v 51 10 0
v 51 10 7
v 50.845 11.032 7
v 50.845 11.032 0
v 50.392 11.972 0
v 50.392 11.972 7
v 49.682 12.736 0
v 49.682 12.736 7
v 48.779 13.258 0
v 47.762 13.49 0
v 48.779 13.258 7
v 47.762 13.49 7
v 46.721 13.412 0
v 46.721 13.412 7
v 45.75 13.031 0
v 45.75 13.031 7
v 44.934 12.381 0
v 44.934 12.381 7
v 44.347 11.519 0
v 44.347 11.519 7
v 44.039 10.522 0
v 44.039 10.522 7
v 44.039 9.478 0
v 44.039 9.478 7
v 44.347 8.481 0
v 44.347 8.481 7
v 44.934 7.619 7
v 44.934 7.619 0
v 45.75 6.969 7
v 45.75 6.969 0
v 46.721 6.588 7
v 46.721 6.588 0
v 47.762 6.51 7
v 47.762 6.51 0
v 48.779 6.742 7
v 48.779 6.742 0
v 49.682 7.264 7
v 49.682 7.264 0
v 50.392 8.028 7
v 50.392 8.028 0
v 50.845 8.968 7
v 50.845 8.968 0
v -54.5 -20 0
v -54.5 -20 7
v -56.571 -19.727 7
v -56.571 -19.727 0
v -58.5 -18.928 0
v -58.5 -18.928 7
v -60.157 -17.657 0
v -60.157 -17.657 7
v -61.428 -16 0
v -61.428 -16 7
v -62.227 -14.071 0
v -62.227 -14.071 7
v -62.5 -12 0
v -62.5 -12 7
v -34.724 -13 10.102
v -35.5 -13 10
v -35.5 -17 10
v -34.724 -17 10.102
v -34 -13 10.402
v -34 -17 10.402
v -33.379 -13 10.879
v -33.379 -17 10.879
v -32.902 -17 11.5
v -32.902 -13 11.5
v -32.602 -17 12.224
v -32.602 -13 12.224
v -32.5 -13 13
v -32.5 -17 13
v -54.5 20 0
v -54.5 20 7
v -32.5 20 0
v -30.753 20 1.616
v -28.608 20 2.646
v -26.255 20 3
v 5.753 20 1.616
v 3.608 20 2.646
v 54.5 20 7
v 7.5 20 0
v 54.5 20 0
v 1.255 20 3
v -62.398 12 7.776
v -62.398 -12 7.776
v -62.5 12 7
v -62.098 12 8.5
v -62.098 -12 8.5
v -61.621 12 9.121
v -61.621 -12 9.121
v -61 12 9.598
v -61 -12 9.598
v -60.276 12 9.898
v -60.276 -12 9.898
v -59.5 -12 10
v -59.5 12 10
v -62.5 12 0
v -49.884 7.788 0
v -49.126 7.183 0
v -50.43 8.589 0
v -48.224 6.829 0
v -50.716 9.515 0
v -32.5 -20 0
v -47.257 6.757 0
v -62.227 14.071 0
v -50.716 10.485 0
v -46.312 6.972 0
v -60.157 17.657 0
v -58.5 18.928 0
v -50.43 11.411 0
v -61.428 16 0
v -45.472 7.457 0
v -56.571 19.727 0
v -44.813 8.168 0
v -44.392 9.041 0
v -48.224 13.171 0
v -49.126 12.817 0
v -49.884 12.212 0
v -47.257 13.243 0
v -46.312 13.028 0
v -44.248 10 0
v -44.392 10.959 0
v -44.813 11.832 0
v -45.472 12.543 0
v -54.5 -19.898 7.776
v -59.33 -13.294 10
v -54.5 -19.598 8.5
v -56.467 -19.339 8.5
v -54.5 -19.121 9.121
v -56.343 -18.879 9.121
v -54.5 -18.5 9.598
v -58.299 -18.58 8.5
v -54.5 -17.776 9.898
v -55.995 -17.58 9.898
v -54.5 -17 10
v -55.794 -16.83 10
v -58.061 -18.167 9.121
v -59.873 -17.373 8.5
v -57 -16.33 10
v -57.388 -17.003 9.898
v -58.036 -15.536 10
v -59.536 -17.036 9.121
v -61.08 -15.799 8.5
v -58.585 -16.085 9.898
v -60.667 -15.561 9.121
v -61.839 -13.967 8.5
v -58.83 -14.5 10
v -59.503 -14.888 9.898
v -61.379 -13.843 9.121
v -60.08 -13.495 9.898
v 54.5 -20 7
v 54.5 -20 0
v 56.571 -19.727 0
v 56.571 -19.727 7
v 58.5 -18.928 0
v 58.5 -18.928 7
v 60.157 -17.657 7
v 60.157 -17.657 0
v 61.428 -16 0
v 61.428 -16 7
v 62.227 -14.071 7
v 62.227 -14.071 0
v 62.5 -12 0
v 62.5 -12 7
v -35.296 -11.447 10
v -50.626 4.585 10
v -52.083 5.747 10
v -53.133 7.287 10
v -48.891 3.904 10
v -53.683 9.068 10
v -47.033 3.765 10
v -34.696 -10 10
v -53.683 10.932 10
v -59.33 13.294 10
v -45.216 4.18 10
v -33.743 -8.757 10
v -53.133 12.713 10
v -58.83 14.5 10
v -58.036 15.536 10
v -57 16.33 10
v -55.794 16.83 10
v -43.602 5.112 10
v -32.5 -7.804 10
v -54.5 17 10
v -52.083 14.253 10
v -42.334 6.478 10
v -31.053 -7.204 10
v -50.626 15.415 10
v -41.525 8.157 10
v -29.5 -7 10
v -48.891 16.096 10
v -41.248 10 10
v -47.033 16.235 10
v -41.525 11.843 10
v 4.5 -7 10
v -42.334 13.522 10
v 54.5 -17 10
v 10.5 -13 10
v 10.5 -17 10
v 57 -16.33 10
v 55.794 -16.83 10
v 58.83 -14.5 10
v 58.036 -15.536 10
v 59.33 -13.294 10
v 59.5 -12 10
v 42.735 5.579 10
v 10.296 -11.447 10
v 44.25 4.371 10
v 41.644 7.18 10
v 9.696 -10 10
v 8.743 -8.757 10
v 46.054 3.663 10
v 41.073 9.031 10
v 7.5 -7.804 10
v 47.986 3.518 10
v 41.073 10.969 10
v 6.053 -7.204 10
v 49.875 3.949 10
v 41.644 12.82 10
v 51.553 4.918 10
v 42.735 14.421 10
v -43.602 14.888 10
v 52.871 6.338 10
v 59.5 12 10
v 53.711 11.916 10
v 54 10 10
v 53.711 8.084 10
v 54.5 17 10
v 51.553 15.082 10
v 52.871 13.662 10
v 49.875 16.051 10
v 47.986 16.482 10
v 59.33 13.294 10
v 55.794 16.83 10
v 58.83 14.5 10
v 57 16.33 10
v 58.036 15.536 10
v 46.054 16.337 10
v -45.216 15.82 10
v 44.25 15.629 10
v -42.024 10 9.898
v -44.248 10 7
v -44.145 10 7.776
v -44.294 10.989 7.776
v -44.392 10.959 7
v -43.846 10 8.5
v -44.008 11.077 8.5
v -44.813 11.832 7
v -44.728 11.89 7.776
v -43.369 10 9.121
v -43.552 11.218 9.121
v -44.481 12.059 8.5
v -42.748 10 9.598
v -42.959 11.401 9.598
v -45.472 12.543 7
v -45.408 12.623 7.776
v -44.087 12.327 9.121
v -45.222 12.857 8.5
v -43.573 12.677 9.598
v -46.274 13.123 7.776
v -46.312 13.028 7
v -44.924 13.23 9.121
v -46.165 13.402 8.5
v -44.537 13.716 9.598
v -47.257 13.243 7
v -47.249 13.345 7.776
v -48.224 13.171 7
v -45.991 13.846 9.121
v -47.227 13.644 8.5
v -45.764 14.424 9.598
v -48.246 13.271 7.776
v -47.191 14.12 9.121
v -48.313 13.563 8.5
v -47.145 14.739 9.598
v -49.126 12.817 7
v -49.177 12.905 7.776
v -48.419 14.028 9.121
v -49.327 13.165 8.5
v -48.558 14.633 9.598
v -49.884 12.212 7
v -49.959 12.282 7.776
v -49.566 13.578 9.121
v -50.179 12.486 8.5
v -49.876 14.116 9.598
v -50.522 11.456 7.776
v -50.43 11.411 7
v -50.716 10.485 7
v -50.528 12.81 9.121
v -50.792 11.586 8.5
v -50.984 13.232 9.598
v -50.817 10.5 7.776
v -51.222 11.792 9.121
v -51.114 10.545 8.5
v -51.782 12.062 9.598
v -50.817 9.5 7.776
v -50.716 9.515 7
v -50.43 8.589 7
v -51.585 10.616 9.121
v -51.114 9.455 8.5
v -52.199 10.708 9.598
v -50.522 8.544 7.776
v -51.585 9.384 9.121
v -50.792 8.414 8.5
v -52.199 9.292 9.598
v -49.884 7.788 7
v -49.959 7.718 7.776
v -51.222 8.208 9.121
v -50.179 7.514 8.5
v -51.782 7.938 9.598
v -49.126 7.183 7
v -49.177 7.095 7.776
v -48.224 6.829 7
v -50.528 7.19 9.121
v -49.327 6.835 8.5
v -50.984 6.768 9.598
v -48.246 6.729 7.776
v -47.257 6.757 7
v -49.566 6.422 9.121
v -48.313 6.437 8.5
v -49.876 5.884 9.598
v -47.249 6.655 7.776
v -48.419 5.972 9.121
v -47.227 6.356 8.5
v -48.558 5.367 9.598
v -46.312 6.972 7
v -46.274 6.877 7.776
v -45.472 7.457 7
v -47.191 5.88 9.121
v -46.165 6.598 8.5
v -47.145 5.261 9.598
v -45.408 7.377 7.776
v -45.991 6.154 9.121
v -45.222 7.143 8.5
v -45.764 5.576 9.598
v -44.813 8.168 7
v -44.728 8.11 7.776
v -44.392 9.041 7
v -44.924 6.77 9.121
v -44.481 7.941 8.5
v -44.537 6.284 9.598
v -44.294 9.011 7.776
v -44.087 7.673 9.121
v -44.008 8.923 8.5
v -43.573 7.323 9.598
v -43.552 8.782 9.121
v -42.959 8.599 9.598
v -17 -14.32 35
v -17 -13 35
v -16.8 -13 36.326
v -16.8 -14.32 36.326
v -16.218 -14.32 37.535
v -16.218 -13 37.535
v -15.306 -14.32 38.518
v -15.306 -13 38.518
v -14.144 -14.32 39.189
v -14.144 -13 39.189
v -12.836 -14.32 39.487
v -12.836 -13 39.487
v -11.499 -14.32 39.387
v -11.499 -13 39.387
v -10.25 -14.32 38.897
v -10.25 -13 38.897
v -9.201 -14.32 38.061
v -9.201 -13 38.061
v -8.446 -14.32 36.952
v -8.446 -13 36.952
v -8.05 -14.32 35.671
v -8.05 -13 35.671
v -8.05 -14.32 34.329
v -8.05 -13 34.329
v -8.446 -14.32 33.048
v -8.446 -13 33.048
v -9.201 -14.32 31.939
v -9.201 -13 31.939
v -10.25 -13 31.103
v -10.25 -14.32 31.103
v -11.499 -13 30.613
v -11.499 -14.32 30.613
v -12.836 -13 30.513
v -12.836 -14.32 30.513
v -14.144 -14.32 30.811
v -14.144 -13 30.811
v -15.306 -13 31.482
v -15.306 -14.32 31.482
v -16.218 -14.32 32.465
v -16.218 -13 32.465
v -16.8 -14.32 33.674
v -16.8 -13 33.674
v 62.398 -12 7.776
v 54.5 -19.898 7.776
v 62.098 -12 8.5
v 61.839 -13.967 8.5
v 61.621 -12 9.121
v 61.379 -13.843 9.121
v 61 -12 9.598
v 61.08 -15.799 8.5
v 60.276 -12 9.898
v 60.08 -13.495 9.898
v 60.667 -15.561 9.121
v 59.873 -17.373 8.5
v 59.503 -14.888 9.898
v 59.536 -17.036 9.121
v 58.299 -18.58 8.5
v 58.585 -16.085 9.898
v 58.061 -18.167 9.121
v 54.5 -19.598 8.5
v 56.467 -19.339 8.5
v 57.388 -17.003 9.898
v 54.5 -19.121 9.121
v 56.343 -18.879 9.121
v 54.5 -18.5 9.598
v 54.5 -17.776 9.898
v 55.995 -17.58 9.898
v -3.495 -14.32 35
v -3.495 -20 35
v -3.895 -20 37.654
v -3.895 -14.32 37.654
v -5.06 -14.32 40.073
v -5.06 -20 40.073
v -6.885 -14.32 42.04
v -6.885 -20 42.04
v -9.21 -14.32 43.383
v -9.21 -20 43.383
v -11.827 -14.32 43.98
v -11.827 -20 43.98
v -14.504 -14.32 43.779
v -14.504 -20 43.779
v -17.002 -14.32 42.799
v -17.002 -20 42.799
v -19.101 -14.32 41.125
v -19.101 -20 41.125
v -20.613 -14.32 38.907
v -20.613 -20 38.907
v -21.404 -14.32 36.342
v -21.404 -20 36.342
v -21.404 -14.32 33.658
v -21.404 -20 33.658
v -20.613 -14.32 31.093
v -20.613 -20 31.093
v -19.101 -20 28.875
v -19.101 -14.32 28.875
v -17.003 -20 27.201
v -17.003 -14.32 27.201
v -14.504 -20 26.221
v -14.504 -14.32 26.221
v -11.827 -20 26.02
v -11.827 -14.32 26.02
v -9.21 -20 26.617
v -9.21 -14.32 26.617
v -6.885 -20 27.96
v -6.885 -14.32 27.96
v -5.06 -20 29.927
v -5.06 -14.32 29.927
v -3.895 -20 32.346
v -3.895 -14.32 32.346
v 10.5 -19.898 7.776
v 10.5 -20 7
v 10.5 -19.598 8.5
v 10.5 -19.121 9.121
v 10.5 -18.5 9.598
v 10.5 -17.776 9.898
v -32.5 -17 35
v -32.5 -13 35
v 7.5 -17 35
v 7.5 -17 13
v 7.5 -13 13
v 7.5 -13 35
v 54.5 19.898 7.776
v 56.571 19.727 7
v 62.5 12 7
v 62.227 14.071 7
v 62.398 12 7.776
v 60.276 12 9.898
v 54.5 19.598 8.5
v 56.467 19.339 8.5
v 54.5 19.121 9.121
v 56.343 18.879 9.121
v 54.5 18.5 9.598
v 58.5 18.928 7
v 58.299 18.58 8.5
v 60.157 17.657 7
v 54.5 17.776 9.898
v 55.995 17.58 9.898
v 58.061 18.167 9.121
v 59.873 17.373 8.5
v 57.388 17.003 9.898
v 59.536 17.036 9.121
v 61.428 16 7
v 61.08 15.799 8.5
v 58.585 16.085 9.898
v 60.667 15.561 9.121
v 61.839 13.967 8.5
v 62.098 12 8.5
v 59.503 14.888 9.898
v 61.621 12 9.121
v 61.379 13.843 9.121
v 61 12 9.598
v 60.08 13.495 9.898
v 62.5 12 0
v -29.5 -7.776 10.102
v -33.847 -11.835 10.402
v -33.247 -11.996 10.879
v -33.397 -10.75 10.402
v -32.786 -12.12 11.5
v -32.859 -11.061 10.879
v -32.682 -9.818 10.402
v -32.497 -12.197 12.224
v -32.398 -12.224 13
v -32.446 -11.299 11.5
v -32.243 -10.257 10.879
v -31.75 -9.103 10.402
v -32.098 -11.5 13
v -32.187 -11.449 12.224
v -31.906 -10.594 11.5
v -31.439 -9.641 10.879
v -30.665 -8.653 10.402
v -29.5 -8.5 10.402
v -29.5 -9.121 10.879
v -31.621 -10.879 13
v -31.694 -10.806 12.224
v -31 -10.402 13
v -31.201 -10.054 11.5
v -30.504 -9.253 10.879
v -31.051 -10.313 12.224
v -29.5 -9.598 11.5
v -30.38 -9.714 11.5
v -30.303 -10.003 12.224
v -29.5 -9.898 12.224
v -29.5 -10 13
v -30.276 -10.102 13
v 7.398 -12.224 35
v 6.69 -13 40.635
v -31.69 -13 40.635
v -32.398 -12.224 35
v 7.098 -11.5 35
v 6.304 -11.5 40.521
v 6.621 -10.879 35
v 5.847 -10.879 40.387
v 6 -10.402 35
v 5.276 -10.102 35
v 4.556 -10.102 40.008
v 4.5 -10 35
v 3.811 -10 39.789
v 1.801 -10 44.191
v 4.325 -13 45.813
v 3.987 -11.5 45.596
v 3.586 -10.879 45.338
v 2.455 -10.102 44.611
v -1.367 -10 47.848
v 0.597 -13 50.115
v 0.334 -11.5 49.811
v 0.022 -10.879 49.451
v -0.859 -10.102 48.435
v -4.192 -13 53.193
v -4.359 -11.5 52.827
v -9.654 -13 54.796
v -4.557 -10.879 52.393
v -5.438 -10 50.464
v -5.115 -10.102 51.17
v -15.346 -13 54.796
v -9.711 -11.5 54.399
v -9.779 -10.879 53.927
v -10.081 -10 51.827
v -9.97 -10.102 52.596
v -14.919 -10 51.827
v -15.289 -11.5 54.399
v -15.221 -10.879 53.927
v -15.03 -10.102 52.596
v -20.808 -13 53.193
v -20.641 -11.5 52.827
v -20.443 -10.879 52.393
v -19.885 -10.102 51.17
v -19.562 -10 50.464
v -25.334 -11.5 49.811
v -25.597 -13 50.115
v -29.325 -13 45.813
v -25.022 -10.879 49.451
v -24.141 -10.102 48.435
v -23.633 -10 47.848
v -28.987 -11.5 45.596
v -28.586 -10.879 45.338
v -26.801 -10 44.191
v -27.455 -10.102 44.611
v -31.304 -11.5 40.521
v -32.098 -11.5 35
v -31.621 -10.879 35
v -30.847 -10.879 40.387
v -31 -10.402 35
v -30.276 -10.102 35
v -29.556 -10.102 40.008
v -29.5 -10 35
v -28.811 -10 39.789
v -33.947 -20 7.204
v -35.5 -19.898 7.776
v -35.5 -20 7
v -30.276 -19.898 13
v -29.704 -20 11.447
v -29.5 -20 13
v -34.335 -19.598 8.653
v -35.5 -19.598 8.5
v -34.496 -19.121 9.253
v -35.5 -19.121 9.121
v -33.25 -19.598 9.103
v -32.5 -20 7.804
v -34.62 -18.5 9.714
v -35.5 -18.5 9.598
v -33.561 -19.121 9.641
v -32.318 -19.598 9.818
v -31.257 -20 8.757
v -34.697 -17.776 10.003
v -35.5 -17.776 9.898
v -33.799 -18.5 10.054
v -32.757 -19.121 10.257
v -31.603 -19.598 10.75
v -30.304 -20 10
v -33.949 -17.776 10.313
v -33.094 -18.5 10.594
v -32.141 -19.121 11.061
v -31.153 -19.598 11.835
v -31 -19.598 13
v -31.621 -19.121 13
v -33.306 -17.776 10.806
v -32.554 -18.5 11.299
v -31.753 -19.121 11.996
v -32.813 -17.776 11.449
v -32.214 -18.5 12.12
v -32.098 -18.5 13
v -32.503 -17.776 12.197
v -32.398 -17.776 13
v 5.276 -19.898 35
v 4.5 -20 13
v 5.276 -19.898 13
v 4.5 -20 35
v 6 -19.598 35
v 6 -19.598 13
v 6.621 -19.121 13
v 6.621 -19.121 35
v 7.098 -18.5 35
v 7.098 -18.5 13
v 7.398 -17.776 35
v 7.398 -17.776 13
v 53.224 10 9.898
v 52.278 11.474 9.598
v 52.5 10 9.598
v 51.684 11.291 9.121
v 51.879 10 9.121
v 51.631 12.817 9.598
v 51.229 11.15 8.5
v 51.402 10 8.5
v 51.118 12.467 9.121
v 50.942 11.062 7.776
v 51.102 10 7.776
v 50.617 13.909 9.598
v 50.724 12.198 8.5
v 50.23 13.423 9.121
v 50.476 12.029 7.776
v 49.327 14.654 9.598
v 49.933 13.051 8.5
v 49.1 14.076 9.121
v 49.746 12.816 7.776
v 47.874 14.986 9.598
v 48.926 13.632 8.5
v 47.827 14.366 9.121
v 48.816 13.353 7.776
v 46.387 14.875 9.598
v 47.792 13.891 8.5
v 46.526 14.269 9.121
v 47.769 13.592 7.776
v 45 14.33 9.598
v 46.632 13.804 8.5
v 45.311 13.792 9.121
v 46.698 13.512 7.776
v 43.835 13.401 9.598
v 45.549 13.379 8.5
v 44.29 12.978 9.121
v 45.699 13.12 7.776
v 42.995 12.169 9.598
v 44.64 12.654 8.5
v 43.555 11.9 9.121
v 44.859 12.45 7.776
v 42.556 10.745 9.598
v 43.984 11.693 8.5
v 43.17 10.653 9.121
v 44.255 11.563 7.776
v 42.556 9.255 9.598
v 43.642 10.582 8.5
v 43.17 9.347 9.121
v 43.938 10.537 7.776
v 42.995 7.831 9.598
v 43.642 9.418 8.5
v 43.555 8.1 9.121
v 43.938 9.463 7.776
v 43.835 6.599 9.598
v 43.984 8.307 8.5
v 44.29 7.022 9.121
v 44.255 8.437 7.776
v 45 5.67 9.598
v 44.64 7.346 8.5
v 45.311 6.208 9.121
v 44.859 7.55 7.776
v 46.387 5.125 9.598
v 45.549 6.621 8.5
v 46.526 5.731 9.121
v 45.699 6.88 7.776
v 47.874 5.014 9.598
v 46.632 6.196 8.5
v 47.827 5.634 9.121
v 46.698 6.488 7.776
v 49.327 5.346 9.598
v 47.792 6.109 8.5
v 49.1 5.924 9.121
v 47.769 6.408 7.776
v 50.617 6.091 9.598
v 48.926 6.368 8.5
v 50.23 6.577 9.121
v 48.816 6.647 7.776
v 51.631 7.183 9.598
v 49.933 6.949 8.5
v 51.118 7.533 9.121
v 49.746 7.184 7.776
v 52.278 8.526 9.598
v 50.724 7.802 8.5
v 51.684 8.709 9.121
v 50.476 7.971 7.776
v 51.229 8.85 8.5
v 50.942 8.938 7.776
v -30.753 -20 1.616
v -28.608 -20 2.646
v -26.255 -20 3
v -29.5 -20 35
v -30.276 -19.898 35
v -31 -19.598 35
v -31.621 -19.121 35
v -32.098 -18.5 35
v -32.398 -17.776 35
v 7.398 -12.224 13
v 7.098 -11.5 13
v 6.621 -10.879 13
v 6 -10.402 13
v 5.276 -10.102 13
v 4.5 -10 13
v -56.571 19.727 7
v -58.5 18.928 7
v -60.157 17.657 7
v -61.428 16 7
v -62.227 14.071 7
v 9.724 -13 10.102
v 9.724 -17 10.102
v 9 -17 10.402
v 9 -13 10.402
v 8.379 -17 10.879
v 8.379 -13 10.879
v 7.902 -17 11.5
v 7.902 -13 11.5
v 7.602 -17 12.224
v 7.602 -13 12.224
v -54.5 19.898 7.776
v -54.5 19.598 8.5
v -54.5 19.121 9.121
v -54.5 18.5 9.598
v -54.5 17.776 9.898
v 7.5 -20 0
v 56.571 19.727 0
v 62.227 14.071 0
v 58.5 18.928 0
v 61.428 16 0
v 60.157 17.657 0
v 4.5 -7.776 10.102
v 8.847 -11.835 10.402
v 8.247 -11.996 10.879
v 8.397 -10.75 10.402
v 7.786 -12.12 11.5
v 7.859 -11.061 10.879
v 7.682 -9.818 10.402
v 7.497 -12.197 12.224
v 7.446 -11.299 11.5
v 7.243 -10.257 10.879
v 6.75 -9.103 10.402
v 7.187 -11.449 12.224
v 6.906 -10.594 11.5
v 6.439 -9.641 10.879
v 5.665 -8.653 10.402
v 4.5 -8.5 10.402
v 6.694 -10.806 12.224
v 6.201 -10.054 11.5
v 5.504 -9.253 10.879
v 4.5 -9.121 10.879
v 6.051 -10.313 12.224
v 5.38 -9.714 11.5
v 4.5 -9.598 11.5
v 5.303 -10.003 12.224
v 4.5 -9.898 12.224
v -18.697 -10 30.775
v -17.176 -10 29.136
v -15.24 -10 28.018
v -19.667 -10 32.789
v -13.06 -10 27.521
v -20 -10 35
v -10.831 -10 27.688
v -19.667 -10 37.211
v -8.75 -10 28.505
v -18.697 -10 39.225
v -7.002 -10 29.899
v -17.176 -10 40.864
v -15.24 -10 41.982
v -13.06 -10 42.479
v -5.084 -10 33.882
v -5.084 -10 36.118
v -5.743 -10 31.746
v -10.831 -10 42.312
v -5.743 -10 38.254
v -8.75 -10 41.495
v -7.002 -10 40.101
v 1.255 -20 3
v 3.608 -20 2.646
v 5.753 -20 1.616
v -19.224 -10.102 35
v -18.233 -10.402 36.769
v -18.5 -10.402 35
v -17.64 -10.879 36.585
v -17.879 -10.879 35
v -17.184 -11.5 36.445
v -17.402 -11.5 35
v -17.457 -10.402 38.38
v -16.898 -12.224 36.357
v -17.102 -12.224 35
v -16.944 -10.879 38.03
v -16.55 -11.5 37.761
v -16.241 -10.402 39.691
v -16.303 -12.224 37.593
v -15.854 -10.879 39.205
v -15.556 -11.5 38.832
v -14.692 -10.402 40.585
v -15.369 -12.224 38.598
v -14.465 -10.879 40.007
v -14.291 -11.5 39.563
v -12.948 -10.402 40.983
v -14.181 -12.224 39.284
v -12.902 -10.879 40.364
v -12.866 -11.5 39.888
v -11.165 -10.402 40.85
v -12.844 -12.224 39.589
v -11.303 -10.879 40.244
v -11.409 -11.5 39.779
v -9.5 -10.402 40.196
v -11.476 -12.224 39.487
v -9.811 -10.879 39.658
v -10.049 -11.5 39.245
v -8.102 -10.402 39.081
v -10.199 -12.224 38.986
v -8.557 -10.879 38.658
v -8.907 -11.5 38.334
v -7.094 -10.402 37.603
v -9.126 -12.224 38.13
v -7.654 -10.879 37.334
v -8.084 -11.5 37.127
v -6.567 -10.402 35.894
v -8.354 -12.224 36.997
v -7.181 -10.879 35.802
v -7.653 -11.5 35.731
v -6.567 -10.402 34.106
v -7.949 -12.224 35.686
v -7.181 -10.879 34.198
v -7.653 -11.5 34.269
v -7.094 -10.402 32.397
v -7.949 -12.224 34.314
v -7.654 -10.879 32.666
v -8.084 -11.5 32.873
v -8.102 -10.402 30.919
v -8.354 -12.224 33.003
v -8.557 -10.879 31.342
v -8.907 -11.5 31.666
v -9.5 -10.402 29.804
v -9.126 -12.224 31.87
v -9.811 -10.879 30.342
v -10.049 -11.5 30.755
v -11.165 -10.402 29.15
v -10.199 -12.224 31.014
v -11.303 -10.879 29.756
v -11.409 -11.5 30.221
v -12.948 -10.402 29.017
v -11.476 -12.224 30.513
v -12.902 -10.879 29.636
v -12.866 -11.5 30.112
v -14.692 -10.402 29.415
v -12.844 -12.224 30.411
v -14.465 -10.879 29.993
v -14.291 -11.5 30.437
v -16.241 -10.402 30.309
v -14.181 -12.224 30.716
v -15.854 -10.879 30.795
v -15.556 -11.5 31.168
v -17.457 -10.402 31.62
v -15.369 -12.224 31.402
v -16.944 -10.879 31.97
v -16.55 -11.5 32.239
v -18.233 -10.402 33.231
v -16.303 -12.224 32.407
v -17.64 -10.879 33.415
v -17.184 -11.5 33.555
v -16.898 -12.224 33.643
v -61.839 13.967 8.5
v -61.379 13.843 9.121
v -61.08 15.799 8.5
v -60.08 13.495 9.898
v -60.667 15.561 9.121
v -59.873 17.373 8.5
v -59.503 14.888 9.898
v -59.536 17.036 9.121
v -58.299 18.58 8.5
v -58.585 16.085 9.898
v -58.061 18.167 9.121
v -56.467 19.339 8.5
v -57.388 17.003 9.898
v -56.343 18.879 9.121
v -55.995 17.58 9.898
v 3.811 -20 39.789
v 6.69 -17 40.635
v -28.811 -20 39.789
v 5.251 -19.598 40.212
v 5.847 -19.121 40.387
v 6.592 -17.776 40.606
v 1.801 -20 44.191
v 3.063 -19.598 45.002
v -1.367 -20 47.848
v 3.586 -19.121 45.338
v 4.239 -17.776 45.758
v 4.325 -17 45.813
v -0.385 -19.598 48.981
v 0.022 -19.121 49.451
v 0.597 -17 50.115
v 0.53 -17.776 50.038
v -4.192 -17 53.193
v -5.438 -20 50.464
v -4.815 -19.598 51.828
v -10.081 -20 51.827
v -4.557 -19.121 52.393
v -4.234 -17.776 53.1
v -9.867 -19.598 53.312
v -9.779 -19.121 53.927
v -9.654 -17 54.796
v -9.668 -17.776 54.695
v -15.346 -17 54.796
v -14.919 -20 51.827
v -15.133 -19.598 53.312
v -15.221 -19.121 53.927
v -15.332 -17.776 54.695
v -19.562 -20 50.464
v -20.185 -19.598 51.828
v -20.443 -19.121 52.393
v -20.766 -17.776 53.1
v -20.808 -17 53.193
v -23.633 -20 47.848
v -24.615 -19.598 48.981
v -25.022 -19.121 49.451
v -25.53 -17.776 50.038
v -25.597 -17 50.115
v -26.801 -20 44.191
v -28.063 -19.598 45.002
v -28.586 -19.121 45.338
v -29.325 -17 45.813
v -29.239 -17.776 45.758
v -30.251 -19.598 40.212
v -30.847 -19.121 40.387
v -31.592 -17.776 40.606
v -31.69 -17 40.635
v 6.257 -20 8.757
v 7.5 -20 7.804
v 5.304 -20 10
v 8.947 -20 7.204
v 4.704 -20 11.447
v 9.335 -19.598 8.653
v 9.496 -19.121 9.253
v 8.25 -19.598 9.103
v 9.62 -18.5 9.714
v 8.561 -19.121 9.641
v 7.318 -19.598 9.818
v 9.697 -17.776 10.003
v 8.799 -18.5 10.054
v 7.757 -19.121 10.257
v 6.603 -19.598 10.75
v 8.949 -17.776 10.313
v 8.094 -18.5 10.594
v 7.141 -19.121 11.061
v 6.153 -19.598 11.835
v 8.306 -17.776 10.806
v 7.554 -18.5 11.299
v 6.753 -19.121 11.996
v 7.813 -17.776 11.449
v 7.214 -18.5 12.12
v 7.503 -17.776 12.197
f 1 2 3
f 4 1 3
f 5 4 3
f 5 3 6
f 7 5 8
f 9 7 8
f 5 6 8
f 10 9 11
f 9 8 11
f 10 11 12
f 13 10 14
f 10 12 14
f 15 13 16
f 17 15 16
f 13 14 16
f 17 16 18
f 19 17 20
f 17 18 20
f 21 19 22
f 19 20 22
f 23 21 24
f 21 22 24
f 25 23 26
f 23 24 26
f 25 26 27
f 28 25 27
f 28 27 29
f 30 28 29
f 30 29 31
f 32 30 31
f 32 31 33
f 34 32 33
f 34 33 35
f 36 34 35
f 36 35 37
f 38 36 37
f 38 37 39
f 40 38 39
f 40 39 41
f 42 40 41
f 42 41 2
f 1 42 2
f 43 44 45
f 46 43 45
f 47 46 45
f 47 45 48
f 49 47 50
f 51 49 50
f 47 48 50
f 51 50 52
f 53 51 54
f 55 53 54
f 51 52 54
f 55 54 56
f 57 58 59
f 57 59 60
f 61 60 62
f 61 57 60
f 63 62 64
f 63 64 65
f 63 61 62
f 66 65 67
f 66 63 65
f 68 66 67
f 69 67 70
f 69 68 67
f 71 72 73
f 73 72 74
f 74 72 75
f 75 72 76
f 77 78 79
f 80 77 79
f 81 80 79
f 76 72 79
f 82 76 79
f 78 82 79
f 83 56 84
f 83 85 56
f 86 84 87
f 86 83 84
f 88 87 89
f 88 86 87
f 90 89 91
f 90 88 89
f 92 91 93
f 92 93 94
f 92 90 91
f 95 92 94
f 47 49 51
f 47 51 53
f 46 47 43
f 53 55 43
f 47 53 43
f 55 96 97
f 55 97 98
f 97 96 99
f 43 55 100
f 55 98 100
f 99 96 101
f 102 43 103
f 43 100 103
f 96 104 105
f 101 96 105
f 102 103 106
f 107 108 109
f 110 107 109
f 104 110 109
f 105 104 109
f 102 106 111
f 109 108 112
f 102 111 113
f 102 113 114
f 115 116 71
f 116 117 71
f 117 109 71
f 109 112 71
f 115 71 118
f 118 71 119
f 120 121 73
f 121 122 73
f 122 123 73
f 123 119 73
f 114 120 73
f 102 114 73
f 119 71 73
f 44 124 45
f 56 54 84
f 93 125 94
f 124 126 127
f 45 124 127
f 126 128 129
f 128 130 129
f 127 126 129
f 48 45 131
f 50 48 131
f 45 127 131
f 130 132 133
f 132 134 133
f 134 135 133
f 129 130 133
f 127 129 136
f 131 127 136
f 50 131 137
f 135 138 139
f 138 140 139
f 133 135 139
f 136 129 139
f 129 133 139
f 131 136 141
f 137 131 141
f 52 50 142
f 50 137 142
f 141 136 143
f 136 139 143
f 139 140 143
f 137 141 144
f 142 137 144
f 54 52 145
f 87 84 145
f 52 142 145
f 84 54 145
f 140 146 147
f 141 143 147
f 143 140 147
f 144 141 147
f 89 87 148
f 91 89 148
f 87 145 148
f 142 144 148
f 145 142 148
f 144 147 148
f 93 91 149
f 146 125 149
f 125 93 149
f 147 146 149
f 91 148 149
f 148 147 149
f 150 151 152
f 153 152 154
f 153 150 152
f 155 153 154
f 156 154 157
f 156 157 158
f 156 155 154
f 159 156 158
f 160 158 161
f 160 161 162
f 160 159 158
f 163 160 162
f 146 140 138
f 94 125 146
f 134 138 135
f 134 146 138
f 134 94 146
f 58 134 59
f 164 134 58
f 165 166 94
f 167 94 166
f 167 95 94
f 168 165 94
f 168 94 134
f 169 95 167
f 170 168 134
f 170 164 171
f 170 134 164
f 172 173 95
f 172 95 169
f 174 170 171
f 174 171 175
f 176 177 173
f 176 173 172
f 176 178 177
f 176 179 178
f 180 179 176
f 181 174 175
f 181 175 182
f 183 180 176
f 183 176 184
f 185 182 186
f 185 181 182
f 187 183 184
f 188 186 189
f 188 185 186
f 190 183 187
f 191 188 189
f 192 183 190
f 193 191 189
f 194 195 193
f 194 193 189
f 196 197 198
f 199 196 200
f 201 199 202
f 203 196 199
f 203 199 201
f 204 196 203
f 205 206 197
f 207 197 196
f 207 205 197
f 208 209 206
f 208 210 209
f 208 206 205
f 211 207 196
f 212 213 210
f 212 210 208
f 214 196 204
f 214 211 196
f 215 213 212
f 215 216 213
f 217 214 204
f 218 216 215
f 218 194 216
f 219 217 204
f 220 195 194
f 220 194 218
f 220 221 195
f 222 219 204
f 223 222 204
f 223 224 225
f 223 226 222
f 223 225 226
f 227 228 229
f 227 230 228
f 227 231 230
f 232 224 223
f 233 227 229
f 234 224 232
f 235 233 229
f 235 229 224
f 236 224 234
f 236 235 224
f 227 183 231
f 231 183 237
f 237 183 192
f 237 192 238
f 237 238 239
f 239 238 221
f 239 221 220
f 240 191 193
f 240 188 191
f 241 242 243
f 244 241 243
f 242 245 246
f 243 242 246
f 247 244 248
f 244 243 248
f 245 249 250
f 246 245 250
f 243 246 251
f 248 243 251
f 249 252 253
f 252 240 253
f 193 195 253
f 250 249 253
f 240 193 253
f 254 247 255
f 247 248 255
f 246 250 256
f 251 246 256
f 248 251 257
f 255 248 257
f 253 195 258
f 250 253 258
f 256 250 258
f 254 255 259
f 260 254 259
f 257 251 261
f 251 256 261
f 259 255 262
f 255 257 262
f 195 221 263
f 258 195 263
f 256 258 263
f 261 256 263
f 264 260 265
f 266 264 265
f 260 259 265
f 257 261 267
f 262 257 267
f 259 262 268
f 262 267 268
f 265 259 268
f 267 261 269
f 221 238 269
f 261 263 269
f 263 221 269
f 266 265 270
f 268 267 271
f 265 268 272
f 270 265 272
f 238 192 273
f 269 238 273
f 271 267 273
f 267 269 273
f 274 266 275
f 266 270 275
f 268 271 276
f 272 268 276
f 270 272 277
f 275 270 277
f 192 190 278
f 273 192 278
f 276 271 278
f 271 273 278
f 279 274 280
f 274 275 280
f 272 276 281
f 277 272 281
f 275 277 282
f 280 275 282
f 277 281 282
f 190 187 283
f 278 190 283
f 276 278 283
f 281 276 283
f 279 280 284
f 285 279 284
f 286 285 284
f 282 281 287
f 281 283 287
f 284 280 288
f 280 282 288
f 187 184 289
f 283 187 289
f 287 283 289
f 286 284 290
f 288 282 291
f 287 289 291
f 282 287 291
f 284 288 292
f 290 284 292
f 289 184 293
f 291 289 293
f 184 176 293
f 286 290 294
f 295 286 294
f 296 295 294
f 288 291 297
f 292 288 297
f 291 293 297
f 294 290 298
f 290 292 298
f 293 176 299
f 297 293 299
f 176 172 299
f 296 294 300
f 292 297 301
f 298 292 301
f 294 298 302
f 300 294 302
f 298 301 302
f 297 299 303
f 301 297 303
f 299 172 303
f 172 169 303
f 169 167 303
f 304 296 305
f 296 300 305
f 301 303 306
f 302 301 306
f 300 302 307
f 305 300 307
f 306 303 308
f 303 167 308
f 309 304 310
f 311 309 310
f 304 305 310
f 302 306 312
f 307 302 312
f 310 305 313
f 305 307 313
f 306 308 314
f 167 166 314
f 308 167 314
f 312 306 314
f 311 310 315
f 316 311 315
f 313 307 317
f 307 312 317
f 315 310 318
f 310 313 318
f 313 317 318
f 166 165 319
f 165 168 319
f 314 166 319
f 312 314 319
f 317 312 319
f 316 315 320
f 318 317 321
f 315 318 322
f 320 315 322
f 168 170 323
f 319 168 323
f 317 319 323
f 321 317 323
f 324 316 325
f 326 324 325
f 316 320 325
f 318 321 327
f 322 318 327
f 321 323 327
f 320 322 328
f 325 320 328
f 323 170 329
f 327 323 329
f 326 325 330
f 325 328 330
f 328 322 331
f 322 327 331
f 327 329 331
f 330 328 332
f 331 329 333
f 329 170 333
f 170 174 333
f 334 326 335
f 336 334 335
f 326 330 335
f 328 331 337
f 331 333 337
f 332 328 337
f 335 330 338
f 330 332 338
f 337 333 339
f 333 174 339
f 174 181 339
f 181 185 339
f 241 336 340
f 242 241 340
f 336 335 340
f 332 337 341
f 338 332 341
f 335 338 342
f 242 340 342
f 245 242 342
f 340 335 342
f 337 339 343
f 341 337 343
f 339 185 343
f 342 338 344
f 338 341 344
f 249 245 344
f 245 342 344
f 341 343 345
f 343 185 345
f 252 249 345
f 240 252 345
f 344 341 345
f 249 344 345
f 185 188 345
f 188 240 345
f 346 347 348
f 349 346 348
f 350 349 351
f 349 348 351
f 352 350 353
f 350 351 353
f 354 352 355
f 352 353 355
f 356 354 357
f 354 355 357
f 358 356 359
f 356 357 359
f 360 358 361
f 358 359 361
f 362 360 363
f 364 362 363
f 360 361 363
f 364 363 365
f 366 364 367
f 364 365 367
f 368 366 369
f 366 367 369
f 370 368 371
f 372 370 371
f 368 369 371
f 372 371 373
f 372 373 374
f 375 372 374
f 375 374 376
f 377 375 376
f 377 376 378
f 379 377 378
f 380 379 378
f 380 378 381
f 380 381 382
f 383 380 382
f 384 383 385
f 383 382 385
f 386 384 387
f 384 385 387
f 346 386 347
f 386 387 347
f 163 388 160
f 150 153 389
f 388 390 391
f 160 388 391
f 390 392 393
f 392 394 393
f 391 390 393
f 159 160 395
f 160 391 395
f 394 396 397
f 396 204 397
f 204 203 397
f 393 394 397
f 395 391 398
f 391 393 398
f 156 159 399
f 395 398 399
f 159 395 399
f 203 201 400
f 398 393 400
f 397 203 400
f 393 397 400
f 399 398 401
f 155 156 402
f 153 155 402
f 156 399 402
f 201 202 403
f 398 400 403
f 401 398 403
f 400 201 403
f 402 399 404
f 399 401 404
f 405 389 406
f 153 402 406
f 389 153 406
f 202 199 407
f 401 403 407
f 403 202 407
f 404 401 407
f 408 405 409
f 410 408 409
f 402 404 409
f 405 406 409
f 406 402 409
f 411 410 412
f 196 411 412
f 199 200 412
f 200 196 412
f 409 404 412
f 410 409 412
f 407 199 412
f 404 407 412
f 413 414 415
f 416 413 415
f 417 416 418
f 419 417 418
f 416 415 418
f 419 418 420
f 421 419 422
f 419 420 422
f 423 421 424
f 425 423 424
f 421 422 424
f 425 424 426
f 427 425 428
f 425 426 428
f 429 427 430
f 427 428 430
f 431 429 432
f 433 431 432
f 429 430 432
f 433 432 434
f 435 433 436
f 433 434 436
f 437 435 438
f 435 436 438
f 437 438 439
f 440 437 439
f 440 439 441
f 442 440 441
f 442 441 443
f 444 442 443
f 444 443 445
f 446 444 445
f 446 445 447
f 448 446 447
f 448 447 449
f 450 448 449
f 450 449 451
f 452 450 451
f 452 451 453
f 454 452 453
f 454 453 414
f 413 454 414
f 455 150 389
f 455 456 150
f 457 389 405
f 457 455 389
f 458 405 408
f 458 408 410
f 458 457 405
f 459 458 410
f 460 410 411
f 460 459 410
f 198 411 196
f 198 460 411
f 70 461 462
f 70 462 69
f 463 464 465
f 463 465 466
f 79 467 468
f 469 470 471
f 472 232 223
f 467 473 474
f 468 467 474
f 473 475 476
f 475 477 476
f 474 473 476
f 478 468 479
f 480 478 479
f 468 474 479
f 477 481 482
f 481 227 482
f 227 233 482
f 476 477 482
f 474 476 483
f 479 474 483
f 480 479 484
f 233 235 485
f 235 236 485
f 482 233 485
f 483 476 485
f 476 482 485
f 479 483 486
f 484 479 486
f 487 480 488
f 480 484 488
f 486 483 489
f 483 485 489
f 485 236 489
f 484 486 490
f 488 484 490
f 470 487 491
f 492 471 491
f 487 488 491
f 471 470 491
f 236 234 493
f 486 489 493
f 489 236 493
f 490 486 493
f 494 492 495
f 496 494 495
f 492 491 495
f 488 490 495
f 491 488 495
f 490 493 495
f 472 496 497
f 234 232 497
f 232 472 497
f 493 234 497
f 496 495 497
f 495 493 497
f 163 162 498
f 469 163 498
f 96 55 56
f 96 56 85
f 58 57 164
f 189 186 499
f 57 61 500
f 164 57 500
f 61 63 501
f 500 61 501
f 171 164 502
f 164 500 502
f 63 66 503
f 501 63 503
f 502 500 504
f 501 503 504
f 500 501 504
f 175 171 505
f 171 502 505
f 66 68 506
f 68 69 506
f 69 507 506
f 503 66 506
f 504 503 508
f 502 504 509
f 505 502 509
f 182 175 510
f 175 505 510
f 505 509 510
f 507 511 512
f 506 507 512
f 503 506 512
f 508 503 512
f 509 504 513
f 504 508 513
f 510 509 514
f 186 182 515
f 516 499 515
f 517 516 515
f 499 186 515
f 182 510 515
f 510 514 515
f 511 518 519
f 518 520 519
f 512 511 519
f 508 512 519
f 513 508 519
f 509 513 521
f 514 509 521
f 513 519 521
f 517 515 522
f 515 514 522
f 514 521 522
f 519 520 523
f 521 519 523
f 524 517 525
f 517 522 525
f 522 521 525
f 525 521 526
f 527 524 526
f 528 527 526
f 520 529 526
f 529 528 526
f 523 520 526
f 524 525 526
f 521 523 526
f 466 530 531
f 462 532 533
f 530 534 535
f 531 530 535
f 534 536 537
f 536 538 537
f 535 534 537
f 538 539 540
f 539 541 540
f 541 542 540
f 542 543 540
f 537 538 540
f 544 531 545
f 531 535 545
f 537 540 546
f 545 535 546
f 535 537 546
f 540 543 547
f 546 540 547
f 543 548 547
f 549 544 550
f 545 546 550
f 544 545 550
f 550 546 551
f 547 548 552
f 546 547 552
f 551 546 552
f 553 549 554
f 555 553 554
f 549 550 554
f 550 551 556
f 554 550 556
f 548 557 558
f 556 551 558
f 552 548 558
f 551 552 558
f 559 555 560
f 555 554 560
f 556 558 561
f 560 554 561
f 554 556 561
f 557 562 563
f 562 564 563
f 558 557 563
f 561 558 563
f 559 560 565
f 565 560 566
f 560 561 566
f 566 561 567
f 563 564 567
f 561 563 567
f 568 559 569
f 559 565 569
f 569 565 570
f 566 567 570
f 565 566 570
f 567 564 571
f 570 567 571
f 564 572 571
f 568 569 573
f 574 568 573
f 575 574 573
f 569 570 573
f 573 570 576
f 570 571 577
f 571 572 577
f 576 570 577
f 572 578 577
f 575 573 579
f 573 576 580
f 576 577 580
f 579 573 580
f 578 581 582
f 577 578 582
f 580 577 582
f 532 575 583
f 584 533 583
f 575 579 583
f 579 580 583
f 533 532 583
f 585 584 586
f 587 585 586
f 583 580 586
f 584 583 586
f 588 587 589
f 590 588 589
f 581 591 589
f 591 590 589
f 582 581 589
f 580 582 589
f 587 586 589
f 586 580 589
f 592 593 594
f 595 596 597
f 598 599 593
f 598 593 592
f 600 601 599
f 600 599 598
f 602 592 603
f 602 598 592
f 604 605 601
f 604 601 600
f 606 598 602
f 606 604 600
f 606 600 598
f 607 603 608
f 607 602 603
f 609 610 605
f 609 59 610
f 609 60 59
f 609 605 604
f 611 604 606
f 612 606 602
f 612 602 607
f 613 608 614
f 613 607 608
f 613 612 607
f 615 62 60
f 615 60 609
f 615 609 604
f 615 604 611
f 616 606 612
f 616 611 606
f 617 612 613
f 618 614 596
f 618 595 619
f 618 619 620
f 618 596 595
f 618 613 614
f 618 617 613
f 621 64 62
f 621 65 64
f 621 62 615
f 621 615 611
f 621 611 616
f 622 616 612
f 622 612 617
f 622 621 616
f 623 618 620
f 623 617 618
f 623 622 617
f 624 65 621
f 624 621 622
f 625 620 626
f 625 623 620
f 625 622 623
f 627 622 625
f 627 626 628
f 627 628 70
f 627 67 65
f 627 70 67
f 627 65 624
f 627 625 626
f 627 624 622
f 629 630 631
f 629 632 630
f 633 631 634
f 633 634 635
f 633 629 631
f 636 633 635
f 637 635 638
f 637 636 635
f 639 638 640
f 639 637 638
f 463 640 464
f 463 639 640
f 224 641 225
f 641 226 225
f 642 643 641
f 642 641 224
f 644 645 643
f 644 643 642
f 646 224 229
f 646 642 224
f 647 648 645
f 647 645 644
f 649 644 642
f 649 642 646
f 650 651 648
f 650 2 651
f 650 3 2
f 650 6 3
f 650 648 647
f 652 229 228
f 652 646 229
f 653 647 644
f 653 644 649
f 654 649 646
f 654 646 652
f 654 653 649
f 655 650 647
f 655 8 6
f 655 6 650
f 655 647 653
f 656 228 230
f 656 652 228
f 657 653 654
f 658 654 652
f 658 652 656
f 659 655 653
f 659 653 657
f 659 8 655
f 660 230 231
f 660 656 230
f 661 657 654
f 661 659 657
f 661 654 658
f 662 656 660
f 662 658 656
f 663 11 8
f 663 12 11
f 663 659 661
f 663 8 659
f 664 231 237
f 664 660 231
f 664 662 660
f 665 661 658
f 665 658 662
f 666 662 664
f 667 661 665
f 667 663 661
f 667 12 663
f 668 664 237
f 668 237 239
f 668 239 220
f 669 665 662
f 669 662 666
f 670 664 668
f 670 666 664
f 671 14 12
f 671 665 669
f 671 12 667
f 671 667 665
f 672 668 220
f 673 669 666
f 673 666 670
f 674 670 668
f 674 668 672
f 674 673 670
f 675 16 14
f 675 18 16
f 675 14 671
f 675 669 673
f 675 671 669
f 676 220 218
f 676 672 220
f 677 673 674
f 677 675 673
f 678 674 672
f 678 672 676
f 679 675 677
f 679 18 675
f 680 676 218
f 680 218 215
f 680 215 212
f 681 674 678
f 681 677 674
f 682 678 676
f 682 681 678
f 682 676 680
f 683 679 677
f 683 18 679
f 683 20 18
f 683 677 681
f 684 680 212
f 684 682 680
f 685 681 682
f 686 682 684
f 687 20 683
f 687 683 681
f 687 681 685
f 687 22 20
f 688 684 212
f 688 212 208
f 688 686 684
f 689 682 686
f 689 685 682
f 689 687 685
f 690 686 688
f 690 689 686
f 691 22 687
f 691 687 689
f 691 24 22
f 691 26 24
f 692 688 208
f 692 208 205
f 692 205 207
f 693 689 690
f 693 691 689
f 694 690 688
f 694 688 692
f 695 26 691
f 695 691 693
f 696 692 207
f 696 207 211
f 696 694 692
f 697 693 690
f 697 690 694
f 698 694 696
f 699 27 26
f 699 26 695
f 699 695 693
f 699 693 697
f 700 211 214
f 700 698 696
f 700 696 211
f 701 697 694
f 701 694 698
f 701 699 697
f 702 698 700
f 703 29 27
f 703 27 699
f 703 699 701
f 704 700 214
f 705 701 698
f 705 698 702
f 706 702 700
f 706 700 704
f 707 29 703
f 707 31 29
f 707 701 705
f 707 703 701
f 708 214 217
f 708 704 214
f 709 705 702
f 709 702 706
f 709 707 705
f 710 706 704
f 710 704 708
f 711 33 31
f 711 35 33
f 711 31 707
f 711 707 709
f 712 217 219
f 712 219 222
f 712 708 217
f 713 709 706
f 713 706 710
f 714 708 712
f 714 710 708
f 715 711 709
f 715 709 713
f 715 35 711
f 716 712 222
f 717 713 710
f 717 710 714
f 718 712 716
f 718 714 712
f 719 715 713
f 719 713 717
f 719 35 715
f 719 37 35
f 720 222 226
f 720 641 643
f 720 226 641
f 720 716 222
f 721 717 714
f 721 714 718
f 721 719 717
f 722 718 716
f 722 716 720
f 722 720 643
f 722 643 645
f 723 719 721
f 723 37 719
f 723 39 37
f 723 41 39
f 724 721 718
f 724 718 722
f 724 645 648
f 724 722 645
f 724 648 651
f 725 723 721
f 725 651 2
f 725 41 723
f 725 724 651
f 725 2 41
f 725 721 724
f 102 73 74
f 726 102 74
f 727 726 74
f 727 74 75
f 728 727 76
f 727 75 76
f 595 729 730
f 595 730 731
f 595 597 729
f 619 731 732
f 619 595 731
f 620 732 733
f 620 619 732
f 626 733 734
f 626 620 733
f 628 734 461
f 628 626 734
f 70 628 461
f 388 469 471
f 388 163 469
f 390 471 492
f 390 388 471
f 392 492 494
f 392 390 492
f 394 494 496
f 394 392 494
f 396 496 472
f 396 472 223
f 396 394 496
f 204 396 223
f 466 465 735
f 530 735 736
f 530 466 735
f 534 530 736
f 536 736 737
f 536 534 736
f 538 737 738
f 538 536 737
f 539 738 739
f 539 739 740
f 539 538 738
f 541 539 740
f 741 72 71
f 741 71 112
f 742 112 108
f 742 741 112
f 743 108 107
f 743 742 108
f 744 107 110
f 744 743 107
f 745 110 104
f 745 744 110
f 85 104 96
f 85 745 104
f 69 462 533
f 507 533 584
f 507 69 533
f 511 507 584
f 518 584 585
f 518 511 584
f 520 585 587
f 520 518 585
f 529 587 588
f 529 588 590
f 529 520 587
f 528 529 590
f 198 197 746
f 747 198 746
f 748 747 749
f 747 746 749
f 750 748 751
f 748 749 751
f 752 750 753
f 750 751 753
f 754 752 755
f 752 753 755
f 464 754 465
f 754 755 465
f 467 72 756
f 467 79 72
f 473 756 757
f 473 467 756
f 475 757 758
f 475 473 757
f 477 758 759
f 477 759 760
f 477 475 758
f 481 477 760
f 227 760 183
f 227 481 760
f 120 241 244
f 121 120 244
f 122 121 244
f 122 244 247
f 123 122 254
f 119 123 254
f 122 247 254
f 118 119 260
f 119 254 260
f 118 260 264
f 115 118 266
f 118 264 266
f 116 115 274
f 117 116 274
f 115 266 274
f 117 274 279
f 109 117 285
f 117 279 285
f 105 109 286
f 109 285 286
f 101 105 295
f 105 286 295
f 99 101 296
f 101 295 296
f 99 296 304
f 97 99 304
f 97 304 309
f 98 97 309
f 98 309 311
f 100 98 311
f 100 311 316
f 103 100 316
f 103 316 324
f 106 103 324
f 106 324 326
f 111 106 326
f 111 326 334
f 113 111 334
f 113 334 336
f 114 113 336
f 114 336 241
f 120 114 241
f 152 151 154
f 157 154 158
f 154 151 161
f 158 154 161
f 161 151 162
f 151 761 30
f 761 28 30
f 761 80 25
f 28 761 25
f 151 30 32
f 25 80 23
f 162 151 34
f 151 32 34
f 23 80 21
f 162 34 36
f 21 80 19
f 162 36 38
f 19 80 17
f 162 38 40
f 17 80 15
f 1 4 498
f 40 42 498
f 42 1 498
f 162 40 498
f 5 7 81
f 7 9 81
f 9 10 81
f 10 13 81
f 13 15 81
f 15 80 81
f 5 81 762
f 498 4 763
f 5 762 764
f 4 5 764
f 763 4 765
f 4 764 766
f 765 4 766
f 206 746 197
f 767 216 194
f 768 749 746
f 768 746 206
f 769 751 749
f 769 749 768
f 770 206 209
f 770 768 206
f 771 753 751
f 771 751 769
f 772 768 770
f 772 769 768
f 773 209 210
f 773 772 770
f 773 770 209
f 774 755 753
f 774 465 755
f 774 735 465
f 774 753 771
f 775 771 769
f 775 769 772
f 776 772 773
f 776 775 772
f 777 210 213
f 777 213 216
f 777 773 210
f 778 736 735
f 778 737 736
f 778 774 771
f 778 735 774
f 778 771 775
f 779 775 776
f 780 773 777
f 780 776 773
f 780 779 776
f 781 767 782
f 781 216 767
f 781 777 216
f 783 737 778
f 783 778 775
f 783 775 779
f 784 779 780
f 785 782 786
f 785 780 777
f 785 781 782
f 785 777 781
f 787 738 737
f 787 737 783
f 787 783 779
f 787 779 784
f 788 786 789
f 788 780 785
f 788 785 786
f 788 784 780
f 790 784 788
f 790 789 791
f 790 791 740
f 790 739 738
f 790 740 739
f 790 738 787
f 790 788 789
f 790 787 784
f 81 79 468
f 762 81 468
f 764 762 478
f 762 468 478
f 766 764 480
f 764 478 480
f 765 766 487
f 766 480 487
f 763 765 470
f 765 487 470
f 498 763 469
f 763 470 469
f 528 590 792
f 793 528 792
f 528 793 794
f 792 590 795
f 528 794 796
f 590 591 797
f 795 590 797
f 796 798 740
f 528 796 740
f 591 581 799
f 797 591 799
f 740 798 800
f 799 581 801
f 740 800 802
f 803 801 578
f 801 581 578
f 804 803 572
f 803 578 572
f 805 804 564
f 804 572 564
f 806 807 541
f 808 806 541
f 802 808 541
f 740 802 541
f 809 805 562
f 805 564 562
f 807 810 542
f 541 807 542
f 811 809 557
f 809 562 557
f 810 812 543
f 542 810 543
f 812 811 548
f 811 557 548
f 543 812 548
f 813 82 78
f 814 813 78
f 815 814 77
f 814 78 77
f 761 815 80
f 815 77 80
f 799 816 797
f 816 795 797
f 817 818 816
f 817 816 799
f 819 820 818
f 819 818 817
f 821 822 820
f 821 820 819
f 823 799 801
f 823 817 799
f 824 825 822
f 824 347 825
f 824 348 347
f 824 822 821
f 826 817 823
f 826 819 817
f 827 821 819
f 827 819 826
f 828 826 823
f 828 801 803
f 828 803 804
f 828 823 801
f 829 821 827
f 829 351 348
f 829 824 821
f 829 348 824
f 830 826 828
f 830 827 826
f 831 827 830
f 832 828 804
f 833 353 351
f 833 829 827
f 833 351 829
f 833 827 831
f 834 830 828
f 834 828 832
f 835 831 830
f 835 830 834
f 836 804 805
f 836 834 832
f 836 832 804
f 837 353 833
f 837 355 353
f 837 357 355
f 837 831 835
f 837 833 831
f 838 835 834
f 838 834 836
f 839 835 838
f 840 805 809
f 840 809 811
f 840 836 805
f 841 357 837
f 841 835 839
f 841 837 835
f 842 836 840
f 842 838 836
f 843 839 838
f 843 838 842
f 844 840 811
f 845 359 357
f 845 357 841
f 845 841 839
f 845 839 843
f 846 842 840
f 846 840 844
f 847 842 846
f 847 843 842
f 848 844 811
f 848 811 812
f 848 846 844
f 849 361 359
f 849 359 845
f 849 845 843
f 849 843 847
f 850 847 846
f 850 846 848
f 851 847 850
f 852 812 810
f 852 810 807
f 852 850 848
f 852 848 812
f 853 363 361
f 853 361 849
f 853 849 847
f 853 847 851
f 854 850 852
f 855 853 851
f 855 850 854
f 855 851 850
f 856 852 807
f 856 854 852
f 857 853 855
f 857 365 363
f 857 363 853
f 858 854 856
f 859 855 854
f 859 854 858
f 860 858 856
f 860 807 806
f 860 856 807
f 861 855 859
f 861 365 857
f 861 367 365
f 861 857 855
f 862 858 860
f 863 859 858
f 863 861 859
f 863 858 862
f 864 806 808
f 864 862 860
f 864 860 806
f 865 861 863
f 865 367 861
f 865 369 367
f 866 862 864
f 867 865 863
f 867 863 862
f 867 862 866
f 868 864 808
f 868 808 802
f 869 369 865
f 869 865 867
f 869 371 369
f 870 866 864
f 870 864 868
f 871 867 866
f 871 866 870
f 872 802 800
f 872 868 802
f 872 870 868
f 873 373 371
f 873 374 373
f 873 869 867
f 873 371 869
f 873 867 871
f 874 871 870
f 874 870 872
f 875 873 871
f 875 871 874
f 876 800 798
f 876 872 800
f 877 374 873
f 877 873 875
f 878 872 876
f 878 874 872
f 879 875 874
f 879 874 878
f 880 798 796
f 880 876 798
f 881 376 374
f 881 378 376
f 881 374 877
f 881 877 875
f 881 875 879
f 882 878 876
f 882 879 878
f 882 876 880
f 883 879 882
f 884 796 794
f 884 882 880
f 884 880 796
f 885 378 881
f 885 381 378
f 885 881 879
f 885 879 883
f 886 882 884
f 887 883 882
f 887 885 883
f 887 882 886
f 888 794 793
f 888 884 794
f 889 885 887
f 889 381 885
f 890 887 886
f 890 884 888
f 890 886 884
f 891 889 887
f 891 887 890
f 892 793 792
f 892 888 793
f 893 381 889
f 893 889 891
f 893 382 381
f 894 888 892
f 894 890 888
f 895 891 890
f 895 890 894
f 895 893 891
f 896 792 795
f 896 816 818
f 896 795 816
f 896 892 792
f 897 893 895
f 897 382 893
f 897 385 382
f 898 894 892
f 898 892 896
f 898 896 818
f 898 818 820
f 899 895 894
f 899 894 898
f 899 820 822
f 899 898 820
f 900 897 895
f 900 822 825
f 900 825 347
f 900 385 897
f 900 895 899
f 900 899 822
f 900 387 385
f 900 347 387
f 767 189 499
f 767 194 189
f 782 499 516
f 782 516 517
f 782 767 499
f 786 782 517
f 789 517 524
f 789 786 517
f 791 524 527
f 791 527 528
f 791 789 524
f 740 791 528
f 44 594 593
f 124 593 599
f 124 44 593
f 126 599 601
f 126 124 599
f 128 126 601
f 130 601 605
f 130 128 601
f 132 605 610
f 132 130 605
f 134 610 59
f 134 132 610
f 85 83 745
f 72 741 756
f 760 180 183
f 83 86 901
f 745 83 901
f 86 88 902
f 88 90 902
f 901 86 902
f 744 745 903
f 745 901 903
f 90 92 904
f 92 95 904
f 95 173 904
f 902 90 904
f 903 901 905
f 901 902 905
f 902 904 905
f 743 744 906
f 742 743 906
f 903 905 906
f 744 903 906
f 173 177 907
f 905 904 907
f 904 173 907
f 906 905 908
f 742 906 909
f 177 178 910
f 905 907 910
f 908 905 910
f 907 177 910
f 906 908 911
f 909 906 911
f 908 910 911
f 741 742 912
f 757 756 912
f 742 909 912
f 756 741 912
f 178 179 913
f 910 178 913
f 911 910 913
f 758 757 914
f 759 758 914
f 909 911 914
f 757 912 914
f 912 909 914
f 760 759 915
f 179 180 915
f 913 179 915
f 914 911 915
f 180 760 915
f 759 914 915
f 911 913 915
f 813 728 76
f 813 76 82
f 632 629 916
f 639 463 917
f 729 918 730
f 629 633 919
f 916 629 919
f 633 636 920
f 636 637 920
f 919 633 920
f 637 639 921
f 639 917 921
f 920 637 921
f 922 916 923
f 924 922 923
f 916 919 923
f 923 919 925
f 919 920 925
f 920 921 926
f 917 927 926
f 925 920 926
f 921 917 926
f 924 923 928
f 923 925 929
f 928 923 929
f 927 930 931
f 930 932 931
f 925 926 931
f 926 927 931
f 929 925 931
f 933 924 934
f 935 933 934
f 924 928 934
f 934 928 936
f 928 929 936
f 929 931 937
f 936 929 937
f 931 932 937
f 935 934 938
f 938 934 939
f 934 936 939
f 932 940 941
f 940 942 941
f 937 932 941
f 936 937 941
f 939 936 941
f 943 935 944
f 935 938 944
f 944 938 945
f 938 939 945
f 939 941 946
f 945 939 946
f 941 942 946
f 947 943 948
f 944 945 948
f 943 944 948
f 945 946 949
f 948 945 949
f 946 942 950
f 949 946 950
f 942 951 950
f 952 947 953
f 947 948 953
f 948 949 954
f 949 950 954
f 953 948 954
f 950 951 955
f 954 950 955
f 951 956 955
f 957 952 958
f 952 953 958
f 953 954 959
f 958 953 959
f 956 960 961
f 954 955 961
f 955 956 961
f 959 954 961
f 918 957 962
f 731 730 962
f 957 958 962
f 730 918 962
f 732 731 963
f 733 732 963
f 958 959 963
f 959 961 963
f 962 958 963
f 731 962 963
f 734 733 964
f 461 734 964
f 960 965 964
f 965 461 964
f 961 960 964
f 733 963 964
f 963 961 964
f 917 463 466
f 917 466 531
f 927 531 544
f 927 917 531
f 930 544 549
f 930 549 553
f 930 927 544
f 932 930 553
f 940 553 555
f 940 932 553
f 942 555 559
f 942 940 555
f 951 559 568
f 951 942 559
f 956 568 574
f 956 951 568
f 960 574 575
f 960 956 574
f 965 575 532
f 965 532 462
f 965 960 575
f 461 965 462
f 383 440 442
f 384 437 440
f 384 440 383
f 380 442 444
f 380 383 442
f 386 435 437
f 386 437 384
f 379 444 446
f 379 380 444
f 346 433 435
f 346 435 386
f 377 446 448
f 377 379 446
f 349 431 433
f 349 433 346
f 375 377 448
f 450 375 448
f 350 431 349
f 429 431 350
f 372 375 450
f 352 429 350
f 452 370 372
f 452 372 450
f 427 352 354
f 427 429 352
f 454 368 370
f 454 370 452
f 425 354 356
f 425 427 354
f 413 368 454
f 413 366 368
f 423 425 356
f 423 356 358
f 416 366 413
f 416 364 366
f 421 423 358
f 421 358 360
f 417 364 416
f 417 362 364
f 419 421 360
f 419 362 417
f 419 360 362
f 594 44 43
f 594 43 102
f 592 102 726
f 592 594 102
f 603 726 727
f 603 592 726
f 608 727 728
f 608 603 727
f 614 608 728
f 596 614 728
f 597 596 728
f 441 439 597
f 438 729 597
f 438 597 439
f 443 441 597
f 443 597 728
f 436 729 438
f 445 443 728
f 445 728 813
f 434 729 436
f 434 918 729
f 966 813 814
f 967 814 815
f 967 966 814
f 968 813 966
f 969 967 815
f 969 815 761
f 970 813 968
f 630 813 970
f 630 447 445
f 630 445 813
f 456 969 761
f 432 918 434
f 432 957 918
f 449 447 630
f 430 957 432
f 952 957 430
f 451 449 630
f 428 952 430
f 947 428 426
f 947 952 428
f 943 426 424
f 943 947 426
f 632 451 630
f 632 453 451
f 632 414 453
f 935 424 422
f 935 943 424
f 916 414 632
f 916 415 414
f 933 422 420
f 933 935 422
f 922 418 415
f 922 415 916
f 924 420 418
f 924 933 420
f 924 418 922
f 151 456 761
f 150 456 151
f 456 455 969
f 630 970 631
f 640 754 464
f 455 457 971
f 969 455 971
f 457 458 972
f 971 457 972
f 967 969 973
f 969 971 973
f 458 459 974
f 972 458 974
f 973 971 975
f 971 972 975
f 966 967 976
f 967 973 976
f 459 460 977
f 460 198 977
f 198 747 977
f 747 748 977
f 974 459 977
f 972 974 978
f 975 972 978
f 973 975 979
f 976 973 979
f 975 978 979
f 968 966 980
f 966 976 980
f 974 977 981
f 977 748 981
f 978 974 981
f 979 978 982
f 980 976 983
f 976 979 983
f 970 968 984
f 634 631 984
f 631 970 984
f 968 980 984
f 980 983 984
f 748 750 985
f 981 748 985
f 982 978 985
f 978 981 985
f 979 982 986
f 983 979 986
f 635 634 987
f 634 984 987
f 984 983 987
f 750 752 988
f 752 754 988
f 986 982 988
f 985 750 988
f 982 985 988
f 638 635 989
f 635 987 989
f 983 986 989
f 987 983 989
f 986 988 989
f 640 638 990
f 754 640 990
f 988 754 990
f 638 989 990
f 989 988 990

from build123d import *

# Parameters (mm, degrees)
F0_W           = 125
F0_H           = 40
F1_DEPTH       = 10
F3_DEPTH       = 10
F5_D           = 9
F5_CBORE_D     = 18.01
F5_CBORE_DEPTH = 5.68
F6_W           = 40
F6_H           = 3
F7_DEPTH       = 40.001
F8_T1_DEPTH    = 40
F9_R           = 3.2524289183
F10_DEPTH      = 10.001
F11_R          = 3.5
F12_DEPTH      = 25
F13_R          = 8
F14_R          = 3


# Not quite as in the source:
# - a fillet or chamfer that OpenCascade refuses, or shapes differently, is made with other operations: its cross-section is extruded or revolved along the edge and cut away or added


with BuildPart() as f1:
    # F0 (on Top) → F1 (new body)
    with BuildSketch(Plane.XY):
        Rectangle(F0_W, F0_H)
    extrude(amount=F1_DEPTH)

    # F2 (on face) → F3 (join)
    with BuildSketch(Plane.XZ.offset(20)):
        with BuildLine():
            Line((-32.5, 35), (-32.5, 10))
            Line((-32.5, 10), (7.5, 10))
            Line((7.5, 10), (7.5, 35))
            ThreePointArc((7.5, 35), (-12.5, 55), (-32.5, 35))
        make_face()
    extrude(amount=-F3_DEPTH)

    # F5 (through all)
    with Locations(Plane.XZ.offset(20)):
        with Locations((-12.5, 35)):
            CounterBoreHole(F5_D / 2, F5_CBORE_D / 2, F5_CBORE_DEPTH)

    # F6 (on face) → F7 (cut, through all)
    with BuildSketch(Plane.XZ.offset(20)):
        with Locations((-12.5, 1.5)):
            Rectangle(F6_W, F6_H)
    extrude(amount=-F7_DEPTH, mode=Mode.SUBTRACT)

    # F8: fillet of radius 8 on 2 edges, made by hand

    # F8_s2 → F8_t1 (join)
    with BuildSketch(Plane.XZ.offset(-20)):
        with BuildLine():
            ThreePointArc((-32.5, 0), (-29.7191036167, 2.2111025509), (-26.2550020016, 3))
            Line((-26.2550020016, 3), (-32.5, 3))
            Line((-32.5, 3), (-32.5, 0))
        make_face()
        with BuildLine():
            ThreePointArc((1.2550020016, 3), (4.7191036167, 2.2111025509), (7.5, 0))
            Line((7.5, 0), (7.5, 3))
            Line((7.5, 3), (1.2550020016, 3))
        make_face()
    extrude(amount=F8_T1_DEPTH)

    # F9 (on face) → F10 (cut, through all)
    with BuildSketch(Plane.XY.offset(10)):
        with Locations((-47.5, 10)):
            Circle(F9_R)
    extrude(amount=-F10_DEPTH, mode=Mode.SUBTRACT)

    # F11 (on face) → F12 (cut)
    with BuildSketch(Plane.XY.offset(10)):
        with Locations((47.5, 10)):
            Circle(F11_R)
    extrude(amount=-F12_DEPTH, mode=Mode.SUBTRACT)

    # F13
    f13_edges = [f1.edges().sort_by_distance(p)[0] for p in [
        (62.5, -20, 5),
        (-62.5, -20, 5),
        (-62.5, 20, 5),
        (62.5, 20, 5),
    ]]
    fillet(f13_edges, radius=F13_R)

    # F14
    f14_edges = [f1.edges().sort_by_distance(p)[0] for p in [
        (7.5, -15, 10),
        (-32.5, -15, 10),
        (-62.5, 0, 10),
        (-60.156854, 17.656854, 10),
        (-60.156854, -17.656854, 10),
        (0, 20, 10),
        (-43.5, -20, 10),
        (60.156854, 17.656854, 10),
        (62.5, 0, 10),
        (-12.5, -10, 10),
        (60.156854, -17.656854, 10),
        (31, -20, 10),
        (-50.752429, 10, 10),
        (44, 10, 10),
        (-12.5, -10, 55),
        (7.5, -10, 22.5),
        (-32.5, -10, 22.5),
        (-17, -10, 35),
        (-32.5, -20, 22.5),
        (-12.5, -20, 55),
        (7.5, -20, 22.5),
    ]]
    fillet(f14_edges, radius=F14_R)


solid = f1.part
